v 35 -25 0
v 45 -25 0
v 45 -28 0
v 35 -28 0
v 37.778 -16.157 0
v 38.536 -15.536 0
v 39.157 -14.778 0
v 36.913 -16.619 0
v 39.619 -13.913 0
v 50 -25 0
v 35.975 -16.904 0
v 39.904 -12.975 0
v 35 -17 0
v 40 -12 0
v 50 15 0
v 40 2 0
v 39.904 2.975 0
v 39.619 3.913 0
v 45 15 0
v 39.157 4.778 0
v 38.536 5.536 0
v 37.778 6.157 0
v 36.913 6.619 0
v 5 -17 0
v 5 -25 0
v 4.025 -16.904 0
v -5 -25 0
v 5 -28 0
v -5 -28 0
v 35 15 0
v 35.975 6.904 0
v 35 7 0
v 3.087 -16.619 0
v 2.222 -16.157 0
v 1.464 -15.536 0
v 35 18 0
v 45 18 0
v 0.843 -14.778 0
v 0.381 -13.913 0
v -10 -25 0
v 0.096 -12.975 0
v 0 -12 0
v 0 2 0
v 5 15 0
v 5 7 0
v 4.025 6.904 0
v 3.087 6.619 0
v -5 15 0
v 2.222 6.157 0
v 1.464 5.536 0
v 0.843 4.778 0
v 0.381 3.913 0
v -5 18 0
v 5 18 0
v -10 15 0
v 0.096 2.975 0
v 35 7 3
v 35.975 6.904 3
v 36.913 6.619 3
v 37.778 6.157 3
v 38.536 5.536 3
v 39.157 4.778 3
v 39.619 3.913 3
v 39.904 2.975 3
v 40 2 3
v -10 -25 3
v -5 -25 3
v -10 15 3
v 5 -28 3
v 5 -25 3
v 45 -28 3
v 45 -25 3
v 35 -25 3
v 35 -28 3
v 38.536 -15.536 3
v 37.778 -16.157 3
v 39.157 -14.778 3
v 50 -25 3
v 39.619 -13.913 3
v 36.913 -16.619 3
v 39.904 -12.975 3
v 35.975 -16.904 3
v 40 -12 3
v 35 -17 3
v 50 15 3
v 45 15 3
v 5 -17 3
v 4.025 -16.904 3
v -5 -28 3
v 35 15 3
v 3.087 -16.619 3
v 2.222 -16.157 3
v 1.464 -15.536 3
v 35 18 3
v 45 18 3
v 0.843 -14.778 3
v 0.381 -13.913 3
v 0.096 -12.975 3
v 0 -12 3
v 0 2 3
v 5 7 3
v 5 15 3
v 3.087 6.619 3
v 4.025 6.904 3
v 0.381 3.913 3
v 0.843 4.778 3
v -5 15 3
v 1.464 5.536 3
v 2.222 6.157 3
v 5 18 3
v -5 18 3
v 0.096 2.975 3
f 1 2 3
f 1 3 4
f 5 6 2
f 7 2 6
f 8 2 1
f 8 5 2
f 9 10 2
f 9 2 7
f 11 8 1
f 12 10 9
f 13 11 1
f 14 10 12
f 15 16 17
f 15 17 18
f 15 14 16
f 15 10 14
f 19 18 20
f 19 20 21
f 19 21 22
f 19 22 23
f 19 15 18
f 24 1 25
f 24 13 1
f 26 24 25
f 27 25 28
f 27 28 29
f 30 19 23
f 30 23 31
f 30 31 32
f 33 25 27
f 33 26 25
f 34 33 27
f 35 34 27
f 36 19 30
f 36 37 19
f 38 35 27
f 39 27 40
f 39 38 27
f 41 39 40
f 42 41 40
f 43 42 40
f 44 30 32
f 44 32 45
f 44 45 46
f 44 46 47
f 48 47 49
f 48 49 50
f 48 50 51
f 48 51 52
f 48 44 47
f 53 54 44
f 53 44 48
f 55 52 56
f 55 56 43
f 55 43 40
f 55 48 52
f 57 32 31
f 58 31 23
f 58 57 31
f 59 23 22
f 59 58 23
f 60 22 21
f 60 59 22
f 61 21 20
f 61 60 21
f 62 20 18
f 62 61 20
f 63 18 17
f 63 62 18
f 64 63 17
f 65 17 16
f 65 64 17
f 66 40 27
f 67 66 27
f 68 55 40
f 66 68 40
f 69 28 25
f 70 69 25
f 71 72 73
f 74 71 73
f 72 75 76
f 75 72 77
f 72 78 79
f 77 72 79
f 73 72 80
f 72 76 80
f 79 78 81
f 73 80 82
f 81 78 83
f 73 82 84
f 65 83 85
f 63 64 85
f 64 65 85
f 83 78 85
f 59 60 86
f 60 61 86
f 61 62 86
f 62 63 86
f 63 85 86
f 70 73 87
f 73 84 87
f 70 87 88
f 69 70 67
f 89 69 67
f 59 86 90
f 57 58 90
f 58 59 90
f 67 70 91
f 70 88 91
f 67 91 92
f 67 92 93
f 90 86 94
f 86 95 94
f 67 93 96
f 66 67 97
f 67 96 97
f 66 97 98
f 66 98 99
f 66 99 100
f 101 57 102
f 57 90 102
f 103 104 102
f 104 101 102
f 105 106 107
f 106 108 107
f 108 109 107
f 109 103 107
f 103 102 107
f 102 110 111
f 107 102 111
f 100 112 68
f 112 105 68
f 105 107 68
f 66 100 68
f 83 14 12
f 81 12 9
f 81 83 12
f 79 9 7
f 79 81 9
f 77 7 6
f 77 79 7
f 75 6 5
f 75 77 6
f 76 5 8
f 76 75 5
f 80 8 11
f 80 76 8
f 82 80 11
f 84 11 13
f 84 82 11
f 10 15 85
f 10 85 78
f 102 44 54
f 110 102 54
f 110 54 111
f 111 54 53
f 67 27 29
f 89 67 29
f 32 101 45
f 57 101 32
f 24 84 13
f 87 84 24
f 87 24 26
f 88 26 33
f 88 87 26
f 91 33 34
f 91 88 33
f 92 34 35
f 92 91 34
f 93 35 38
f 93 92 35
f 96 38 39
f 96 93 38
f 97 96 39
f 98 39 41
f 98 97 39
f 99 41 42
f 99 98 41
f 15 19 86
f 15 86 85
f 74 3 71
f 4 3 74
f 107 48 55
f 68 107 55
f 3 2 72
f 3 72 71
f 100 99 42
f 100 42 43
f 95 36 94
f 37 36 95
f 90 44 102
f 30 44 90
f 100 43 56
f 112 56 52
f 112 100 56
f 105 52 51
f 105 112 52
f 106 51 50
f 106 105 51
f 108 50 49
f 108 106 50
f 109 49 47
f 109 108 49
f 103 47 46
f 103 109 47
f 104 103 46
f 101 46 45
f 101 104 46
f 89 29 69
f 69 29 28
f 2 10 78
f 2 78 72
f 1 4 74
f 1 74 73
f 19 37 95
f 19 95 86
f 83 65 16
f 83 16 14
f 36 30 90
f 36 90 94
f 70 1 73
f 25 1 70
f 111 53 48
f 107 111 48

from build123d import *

# Parameters (mm, degrees)
BOSS_EXTRU_1_DEPTH      = 3
ENL_V_MAT_EXTRU_1_DEPTH = 58.384666942


with BuildPart() as part:
    # Esquisse1 → Boss.-Extru.1 (new body)
    with BuildSketch(Plane.XY):
        Polygon((-5, -25), (-5, -28), (5, -28), (5, -25), (20, -25), (20, 15), (5, 15), (5, 18), (-5, 18), (-5, 15), (-10, 15), (-10, -25), align=None)
    extrude(amount=BOSS_EXTRU_1_DEPTH)

    # Symétrie1: part across plane


with BuildPart() as part_1:
    add(part.part)
    add(part.part.mirror(Plane(origin=(20, 15, 3), x_dir=(0, 0, 1), z_dir=(-1, 0, 0))))

    # Esquisse2 → Enlèv. mat.-Extru.1 (cut, through all)
    with BuildSketch(Plane.XY.offset(3)):
        with BuildLine():
            Line((5, 7), (35, 7))
            ThreePointArc((35, 7), (38.535533906, 5.535533906), (40, 2))
            Line((40, 2), (40, -12))
            ThreePointArc((40, -12), (38.535533906, -15.535533906), (35, -17))
            Line((35, -17), (5, -17))
            ThreePointArc((5, -17), (1.464466094, -15.535533906), (0, -12))
            Line((0, -12), (0, 2))
            ThreePointArc((0, 2), (1.464466094, 5.535533906), (5, 7))
        make_face()
    extrude(amount=-ENL_V_MAT_EXTRU_1_DEPTH, mode=Mode.SUBTRACT)


solid = part_1.part
